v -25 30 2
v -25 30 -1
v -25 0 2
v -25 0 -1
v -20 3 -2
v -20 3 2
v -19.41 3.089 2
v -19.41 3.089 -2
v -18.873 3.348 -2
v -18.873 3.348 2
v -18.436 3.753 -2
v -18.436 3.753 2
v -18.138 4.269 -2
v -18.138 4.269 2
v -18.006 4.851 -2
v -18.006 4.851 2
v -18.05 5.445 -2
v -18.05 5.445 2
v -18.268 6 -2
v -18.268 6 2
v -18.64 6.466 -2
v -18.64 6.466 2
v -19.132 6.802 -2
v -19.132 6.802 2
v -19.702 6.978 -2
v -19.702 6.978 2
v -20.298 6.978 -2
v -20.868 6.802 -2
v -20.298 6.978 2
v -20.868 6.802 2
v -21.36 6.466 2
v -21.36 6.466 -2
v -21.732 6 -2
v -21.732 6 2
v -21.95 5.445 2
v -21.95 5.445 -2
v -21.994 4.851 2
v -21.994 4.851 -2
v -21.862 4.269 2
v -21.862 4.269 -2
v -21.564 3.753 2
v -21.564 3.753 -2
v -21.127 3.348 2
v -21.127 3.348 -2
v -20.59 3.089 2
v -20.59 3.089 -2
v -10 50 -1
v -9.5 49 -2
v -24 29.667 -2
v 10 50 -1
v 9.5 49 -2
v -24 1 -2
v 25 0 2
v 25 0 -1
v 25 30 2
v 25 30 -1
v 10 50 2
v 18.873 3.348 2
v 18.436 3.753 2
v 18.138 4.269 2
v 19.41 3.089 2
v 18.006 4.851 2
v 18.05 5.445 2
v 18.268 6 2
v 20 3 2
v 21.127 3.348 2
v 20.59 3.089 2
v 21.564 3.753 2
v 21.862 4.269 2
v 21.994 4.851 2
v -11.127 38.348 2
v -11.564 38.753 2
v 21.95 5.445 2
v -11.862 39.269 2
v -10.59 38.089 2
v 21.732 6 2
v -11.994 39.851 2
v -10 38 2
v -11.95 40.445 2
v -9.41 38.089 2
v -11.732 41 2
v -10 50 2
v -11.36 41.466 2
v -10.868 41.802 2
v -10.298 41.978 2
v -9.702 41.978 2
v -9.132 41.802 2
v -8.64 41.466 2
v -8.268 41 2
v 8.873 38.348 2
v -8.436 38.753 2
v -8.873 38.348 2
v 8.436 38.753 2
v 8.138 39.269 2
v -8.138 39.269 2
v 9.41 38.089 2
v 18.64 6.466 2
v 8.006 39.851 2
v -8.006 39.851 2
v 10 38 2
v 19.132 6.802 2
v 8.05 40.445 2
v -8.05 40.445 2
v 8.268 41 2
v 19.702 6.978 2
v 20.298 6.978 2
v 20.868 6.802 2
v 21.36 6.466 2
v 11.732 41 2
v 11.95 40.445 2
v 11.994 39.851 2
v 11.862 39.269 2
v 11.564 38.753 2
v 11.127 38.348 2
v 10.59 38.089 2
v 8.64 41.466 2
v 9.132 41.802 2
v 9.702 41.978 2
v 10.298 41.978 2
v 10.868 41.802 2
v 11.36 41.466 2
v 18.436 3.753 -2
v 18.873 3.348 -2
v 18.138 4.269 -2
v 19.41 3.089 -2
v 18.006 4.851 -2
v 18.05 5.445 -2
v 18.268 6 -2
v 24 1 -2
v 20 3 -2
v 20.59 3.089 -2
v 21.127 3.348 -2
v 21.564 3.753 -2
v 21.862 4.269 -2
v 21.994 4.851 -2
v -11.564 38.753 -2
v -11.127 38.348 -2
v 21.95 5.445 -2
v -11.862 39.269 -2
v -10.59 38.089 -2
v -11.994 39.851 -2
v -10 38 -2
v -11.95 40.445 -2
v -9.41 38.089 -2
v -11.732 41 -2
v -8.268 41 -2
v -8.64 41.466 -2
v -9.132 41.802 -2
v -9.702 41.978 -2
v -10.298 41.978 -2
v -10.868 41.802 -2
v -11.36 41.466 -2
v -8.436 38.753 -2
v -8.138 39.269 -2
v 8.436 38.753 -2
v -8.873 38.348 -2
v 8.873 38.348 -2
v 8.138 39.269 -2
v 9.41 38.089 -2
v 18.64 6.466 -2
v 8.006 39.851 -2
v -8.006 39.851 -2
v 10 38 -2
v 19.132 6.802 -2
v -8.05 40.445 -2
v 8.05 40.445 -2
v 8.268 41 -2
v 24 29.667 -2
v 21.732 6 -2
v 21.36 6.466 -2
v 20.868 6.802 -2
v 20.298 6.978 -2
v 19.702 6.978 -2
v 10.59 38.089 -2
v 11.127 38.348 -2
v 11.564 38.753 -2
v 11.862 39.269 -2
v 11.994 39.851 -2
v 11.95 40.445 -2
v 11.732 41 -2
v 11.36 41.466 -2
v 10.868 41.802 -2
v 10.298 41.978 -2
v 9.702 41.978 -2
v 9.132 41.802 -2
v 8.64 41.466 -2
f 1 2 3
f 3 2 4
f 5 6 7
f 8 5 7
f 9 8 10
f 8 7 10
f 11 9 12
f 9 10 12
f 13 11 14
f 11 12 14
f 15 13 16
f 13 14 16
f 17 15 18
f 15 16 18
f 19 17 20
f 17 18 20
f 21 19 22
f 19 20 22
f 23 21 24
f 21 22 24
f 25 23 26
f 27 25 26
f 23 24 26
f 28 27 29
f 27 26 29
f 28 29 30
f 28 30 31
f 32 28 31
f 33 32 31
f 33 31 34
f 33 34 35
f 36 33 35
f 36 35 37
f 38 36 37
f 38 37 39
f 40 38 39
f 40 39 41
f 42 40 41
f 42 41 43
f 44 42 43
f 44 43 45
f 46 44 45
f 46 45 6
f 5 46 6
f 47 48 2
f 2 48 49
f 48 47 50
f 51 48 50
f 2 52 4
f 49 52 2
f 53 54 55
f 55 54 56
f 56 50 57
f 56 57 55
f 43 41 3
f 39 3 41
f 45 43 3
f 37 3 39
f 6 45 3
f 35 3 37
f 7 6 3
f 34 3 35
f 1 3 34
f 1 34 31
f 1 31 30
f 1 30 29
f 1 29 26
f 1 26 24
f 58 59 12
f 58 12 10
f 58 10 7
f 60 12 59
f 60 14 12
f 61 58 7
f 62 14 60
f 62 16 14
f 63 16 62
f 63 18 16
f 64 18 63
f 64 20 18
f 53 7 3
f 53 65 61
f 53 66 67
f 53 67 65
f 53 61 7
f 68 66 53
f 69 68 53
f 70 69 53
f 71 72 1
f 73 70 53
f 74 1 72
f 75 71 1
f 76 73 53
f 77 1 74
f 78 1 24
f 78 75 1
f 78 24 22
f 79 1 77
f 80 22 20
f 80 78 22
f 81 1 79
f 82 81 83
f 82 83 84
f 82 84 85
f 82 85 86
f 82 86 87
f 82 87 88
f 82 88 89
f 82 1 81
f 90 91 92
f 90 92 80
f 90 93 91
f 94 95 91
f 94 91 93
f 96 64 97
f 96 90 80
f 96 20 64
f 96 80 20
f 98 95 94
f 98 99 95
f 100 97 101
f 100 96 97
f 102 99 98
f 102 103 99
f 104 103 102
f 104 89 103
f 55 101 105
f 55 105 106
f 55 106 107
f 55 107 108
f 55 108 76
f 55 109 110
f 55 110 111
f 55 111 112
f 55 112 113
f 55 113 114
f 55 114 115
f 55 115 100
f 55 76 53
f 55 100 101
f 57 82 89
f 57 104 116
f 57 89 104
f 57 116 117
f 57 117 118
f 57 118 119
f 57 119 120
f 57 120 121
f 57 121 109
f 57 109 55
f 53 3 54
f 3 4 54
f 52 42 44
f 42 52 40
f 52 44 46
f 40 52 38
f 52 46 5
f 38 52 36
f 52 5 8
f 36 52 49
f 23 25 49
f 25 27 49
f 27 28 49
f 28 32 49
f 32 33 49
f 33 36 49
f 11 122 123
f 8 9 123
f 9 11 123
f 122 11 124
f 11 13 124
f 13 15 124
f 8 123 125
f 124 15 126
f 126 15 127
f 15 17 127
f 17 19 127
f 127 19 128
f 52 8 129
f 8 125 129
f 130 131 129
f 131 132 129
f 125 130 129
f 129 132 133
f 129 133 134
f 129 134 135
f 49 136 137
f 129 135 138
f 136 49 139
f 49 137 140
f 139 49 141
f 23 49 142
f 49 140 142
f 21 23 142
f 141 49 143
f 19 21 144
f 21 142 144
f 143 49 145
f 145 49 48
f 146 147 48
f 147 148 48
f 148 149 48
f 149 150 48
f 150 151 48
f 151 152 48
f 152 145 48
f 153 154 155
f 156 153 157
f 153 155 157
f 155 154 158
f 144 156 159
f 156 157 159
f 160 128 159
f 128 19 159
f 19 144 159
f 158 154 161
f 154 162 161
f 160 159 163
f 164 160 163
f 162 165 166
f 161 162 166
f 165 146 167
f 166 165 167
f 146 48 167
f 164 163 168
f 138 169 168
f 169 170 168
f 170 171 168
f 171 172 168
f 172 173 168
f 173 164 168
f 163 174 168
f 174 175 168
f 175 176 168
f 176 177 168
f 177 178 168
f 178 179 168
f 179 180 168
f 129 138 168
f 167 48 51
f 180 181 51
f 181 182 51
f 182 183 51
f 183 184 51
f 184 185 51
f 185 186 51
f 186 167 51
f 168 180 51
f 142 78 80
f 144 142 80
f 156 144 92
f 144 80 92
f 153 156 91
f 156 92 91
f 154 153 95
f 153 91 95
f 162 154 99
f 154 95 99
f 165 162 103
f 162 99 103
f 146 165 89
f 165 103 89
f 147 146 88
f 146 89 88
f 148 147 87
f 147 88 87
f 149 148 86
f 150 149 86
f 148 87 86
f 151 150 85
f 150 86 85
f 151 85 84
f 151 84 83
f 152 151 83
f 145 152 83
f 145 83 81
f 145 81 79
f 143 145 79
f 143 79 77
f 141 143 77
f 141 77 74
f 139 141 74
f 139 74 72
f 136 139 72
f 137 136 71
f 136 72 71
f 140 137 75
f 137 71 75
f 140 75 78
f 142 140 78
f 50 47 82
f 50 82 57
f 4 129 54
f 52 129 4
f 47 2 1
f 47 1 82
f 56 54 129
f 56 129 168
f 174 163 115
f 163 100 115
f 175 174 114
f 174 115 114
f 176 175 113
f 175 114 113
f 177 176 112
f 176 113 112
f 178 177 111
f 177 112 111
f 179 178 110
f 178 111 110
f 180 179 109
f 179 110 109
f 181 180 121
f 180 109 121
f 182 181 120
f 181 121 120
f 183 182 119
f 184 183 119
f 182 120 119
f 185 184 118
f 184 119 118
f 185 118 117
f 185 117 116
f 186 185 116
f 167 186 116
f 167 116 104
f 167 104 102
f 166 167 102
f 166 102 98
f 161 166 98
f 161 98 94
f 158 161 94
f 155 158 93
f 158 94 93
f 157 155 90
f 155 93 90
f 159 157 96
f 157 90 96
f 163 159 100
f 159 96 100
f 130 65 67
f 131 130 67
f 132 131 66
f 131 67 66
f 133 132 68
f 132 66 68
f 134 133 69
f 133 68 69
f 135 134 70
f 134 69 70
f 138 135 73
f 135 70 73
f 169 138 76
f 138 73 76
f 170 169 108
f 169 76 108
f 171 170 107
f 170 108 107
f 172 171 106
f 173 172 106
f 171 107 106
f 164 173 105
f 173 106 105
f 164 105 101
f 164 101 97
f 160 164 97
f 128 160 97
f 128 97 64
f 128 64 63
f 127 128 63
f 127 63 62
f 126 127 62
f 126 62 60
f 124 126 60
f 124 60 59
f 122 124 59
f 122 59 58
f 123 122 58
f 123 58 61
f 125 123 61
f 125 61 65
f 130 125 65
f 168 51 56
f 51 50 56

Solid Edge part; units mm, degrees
sketch "Sketch1" plane through (0, 0, 0) normal (0, 0, 1) x (1, 0, 0)
  line L0 (-25, 30) -> (-25, 0)
  line L1 (-25, 0) -> (25, 0)
  line L2 (25, 0) -> (25, 30)
  line L3 (10, 50) -> (25, 30)
  line L4 (-10, 50) -> (10, 50)
  line L5 (-25, 30) -> (-10, 50)
  dimension "D1" = 50
  dimension "D2" = 30
  dimension "D3" = 50
  dimension "D4" = 20
extrude "Protrusion1" add sketch "Sketch1" along normal mid plane 4
hole "Hole_1" at (-10, 40, 2) direction (0, 0, -1) diameter 4 end up to next
hole "Hole1" at (10, 40, 2) direction (0, 0, -1) diameter 4 end up to next
hole "Hole2" at (-20, 5, 2) direction (0, 0, -1) diameter 4 end up to next
hole "Hole3" at (20, 5, 2) direction (0, 0, -1) diameter 4 end up to next
chamfer "Chamfer_1" distance 1 angle 45 6 edges at (25, 15, -2) (17.5, 40, -2) (0, 50, -2) (-17.5, 40, -2) (-25, 15, -2) (0, 0, -2)
properties material "Polyethylene, low density"
